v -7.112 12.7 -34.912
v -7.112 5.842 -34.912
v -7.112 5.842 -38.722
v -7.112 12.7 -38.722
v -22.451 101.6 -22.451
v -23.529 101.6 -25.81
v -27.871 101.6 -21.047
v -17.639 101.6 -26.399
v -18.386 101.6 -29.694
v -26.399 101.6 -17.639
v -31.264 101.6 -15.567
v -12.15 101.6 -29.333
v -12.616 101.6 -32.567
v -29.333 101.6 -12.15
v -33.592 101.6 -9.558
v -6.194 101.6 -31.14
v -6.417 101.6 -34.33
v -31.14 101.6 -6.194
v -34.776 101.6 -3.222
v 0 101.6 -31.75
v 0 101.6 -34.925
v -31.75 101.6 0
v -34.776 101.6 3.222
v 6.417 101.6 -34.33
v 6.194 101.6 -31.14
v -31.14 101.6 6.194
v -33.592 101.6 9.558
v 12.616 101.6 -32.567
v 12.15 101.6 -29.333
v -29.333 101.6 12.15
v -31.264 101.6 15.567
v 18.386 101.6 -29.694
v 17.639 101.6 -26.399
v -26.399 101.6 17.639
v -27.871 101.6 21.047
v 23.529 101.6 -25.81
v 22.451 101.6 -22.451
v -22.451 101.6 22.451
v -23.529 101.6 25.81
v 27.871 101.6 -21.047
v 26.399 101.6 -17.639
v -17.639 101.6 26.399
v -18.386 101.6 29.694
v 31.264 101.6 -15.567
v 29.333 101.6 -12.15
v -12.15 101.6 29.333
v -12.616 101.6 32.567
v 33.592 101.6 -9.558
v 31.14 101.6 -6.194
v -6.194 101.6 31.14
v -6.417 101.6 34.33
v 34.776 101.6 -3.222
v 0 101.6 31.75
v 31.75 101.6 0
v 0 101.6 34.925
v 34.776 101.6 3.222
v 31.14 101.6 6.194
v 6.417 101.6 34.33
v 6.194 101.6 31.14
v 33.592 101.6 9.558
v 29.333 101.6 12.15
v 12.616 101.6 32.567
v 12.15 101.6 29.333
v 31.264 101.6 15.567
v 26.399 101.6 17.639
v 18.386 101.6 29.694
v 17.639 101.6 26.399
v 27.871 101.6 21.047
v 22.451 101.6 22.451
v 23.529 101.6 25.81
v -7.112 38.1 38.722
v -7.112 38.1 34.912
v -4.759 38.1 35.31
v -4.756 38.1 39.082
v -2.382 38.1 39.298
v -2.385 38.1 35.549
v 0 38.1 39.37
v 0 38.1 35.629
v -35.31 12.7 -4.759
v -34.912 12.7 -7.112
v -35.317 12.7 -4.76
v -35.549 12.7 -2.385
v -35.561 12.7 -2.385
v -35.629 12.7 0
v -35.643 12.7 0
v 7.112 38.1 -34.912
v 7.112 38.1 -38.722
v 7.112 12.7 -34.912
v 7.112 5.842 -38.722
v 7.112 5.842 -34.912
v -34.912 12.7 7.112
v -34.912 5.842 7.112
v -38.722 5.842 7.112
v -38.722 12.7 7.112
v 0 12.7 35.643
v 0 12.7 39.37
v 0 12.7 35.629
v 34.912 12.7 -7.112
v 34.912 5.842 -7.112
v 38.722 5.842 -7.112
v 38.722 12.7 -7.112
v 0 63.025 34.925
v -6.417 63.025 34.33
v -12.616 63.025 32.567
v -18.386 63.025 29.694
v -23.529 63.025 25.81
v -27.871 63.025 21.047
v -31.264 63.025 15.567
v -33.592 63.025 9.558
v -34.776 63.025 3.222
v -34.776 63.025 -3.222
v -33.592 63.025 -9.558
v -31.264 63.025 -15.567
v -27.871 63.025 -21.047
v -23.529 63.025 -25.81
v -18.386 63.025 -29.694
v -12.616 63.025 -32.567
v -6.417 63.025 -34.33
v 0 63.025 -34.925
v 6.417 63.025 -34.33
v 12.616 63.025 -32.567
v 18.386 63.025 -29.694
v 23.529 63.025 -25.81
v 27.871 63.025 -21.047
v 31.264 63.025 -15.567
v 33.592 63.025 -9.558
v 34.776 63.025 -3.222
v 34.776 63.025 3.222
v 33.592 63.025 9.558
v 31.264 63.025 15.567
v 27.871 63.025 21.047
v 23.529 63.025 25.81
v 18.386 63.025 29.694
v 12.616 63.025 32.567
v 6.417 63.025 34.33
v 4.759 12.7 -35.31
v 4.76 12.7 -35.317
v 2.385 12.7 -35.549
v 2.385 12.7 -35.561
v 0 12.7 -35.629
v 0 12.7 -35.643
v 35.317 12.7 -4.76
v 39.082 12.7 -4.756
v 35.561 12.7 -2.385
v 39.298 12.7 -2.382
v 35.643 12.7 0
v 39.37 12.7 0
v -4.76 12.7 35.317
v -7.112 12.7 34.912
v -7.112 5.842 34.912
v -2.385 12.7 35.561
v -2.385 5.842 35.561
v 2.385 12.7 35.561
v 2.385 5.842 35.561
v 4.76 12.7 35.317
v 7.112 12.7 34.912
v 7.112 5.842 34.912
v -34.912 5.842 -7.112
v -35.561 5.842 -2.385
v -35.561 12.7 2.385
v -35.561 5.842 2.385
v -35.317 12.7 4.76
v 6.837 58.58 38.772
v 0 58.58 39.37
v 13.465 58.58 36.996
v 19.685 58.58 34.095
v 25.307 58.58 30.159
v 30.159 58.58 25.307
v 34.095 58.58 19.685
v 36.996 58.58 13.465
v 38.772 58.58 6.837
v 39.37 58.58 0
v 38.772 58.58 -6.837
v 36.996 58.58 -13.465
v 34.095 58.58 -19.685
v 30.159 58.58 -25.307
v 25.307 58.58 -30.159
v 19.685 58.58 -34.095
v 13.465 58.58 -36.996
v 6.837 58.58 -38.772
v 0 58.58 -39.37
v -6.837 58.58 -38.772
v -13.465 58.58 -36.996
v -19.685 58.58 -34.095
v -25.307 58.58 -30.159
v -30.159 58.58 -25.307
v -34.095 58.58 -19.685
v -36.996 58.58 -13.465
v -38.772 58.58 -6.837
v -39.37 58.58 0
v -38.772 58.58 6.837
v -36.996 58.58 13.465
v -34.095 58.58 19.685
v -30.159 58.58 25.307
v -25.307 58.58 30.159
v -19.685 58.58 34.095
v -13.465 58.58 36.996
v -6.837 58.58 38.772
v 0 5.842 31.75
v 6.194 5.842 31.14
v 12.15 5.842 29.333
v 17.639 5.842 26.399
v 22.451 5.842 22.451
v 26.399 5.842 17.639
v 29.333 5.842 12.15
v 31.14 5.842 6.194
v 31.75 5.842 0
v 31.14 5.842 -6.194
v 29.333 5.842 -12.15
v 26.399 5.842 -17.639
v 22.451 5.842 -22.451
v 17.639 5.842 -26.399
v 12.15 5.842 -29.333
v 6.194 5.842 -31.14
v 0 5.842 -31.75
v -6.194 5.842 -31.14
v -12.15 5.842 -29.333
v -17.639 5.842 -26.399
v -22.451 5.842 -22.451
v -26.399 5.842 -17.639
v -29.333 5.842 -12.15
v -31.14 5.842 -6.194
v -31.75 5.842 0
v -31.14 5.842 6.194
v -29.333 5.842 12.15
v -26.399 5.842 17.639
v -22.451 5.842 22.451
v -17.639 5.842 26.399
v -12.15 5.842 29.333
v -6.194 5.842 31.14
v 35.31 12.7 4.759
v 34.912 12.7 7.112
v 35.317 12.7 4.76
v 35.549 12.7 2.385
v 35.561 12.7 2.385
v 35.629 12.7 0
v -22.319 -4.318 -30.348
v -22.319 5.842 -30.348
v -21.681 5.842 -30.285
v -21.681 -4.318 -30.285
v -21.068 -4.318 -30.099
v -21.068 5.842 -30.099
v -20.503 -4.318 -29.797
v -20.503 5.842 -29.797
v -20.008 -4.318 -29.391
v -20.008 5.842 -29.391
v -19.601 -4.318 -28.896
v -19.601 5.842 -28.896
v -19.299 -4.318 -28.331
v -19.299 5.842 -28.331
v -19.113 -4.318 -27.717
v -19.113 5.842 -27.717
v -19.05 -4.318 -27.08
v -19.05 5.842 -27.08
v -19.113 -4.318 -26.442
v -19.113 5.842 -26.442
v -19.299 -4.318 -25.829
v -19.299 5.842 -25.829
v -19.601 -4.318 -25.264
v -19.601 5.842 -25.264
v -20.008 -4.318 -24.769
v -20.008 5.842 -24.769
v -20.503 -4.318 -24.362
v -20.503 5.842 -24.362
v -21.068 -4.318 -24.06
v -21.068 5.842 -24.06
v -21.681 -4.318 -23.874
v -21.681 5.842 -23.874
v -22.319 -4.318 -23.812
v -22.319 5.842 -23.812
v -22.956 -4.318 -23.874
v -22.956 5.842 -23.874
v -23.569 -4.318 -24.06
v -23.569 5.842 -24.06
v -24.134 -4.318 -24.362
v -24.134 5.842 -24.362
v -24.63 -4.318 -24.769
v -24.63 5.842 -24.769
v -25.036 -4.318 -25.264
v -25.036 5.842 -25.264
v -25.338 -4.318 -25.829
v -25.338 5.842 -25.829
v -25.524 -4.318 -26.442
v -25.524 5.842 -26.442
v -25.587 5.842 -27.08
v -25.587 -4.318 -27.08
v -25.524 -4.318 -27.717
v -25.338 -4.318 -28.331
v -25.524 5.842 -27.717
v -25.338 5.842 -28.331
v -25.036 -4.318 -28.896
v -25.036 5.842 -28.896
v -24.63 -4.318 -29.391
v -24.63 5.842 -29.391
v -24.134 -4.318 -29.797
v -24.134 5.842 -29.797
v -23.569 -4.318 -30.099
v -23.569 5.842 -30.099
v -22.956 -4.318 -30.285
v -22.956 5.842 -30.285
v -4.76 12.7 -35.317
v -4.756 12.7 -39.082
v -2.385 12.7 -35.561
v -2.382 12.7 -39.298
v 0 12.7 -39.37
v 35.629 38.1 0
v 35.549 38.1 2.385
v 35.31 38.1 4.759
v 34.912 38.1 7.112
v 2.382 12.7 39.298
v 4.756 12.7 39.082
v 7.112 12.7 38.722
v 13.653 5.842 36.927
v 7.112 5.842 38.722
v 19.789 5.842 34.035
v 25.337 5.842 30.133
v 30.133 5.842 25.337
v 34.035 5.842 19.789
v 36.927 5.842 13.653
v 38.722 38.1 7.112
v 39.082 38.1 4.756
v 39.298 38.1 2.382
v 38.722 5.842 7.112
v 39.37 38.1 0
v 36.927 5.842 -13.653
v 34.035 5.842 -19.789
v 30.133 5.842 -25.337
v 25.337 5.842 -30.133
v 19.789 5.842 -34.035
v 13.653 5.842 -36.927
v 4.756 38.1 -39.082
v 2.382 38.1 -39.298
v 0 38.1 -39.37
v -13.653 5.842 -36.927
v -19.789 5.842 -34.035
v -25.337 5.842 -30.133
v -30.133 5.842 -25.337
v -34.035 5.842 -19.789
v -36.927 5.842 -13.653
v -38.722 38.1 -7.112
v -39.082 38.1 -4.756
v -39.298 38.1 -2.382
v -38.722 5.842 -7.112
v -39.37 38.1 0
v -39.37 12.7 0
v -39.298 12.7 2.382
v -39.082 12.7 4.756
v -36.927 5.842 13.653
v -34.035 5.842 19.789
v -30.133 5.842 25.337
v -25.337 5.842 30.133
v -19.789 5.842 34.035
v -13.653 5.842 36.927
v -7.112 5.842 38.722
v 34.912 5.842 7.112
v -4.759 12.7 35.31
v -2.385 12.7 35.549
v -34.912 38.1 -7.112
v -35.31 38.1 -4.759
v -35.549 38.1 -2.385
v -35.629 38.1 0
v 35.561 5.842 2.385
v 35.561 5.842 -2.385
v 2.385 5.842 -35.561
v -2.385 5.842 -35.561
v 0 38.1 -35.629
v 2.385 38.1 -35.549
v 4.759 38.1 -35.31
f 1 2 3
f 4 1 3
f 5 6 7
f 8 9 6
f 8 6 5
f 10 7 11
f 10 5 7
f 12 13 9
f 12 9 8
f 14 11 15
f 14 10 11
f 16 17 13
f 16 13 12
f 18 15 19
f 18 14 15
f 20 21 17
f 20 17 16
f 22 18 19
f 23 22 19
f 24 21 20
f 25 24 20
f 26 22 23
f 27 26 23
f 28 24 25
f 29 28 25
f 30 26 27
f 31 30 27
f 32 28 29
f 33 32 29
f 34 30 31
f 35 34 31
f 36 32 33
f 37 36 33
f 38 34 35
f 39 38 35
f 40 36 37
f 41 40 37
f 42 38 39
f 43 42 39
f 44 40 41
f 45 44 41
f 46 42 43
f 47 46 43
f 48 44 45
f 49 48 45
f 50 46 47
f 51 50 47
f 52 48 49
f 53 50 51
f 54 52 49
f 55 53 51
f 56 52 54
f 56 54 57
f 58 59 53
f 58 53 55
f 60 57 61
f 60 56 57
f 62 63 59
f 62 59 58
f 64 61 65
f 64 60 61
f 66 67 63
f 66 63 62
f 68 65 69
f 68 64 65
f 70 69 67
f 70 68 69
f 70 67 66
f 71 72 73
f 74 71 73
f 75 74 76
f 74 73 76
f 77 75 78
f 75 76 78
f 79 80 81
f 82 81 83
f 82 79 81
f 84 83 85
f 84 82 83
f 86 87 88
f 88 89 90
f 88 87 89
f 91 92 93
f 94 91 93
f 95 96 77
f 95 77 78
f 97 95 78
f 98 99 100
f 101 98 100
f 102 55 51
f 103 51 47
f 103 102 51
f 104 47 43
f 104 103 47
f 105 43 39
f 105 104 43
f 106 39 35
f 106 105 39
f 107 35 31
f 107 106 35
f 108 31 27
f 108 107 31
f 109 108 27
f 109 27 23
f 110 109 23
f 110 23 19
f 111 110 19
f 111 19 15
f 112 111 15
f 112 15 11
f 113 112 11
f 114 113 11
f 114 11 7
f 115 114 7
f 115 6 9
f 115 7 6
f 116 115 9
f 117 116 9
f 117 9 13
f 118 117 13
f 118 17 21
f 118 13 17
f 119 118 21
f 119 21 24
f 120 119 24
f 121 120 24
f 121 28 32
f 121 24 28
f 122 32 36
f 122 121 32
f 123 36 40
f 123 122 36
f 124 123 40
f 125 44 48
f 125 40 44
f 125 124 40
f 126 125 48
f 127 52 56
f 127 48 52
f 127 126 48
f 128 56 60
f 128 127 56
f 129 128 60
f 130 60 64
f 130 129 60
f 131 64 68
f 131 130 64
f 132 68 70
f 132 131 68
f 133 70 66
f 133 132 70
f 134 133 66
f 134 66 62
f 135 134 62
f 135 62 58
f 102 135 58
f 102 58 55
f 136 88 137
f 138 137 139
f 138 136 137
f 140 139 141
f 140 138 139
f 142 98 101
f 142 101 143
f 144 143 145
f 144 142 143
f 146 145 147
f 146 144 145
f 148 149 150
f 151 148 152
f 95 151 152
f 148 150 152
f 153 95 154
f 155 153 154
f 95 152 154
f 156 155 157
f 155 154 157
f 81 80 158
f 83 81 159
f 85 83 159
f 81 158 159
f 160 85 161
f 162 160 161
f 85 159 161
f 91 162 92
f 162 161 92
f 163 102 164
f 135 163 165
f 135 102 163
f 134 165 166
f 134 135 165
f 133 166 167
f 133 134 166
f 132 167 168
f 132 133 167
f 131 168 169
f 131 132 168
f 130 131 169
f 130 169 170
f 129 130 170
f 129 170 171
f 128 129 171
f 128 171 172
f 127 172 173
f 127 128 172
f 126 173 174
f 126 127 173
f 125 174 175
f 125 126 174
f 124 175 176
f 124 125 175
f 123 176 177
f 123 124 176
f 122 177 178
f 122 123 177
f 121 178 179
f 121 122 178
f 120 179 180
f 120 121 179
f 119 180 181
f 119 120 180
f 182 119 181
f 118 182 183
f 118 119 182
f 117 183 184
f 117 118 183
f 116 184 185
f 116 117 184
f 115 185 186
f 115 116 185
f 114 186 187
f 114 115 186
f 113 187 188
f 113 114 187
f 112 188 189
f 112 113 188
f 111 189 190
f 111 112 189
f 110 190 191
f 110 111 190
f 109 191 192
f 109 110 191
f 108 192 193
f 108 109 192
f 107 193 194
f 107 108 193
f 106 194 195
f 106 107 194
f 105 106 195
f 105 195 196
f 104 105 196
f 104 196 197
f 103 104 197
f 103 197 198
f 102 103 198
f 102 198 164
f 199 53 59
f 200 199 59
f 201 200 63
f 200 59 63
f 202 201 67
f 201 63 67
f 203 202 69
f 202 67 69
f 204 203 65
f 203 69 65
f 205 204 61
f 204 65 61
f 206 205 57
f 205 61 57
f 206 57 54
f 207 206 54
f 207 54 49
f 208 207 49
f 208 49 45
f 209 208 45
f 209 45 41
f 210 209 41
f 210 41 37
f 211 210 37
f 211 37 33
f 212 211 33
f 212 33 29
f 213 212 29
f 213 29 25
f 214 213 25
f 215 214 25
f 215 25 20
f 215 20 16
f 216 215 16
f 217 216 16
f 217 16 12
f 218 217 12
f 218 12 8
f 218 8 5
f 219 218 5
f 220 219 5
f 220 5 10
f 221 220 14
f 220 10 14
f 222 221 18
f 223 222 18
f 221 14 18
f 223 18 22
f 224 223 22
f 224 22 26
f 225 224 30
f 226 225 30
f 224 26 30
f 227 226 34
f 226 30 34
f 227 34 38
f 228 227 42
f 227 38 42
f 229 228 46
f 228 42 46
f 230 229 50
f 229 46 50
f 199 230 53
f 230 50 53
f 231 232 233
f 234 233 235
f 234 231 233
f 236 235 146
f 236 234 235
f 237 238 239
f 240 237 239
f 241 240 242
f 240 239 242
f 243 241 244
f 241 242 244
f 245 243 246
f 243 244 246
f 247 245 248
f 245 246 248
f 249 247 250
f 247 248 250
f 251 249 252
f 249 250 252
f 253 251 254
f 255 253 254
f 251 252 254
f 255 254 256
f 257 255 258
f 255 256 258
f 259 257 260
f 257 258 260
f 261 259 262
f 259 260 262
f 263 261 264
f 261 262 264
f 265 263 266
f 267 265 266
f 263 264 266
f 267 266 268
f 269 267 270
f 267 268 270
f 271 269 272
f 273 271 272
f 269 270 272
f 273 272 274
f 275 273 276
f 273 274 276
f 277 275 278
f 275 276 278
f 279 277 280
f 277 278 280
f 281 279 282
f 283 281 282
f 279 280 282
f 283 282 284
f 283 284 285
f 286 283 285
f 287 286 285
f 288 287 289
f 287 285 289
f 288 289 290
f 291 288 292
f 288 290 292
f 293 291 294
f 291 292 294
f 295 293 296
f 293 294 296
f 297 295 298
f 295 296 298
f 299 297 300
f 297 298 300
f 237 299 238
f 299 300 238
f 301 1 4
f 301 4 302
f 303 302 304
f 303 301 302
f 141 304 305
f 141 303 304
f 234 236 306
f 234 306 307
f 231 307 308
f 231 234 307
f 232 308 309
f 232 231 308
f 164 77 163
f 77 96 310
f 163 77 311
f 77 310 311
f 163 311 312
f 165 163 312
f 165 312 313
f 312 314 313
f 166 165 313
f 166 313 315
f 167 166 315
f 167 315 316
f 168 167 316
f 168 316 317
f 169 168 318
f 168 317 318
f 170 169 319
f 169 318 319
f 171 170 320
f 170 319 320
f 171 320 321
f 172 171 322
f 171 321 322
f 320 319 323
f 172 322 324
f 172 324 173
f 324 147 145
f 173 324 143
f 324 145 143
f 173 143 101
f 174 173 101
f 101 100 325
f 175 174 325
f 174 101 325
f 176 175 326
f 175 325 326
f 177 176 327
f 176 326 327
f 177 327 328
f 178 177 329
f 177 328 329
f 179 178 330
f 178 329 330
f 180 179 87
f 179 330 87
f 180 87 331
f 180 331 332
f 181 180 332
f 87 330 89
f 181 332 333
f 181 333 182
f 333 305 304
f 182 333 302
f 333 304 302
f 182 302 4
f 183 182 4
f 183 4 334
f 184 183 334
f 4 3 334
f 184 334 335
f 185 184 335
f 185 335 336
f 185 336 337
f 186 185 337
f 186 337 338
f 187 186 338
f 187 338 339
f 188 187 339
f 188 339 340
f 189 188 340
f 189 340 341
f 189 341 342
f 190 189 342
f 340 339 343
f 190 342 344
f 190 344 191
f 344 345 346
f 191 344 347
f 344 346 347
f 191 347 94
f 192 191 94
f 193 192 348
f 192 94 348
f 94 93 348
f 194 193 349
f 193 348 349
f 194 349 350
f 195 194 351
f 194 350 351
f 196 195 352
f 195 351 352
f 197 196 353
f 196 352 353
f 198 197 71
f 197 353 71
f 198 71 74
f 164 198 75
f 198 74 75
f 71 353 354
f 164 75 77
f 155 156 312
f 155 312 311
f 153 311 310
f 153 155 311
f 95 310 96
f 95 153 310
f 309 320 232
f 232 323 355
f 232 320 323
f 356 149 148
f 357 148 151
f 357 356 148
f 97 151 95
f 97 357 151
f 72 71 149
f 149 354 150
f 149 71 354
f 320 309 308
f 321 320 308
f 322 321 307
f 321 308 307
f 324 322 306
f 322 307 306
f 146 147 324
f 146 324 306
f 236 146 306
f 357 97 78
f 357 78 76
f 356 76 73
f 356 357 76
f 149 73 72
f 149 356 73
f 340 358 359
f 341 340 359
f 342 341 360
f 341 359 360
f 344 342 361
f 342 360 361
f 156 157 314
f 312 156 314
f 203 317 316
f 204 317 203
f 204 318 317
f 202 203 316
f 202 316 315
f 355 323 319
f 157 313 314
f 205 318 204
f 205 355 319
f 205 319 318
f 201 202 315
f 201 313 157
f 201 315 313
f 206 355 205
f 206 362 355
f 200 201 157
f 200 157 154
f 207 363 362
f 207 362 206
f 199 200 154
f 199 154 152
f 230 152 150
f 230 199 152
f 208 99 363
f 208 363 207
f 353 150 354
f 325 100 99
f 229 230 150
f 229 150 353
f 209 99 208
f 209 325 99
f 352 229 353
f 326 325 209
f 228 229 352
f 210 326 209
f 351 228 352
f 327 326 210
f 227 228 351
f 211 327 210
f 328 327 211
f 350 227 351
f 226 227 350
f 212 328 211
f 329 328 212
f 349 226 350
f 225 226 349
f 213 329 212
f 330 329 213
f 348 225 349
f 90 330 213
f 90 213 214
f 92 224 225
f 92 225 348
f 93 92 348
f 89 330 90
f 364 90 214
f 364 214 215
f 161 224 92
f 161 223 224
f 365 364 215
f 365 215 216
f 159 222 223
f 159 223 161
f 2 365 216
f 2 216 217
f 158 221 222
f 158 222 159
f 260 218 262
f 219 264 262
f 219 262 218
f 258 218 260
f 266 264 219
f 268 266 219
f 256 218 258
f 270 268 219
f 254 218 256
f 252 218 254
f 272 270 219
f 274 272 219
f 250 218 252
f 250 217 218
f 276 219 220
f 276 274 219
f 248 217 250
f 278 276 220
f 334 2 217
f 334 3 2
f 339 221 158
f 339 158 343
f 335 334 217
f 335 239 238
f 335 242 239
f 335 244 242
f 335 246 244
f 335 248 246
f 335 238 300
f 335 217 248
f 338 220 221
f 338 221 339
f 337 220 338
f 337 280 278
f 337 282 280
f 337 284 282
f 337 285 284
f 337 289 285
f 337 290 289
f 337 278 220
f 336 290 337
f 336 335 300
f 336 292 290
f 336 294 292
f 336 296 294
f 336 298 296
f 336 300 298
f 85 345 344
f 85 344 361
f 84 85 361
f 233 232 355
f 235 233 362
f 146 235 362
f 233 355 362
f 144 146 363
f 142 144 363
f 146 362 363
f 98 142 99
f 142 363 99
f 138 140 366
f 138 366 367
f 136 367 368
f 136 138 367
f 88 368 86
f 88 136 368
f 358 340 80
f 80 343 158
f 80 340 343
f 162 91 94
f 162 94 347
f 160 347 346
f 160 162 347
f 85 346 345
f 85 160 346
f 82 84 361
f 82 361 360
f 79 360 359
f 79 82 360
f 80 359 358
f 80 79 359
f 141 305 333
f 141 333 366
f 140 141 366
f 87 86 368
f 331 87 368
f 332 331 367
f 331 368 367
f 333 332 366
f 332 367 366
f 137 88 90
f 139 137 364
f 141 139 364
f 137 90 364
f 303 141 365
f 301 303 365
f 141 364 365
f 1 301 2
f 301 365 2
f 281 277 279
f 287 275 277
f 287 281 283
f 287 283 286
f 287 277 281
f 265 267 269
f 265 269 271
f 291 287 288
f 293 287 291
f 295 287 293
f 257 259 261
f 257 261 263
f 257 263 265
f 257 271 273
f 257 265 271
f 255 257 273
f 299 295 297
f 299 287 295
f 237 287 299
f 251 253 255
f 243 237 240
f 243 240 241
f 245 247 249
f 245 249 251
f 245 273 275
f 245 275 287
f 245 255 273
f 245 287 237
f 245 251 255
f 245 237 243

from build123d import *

# Parameters (mm, degrees)
SKETCH1_R           = 39.37
BOSS_EXTRUDE1_DEPTH = 101.6
SKETCH2_R           = 31.75
CUT_EXTRUDE1_DEPTH  = 116.855745649
CUT_EXTRUDE2_START  = -33.02
SKETCH3_R           = 39.37
SKETCH3_R_2         = 34.925
CUT_EXTRUDE2_DEPTH  = 33.02
CUT_EXTRUDE3_DEPTH  = 12.7
SKETCH9_R           = 39.558823483
CUT_EXTRUDE5_DEPTH  = 111.768173967
SKETCH10_R          = 3.268271246
BOSS_EXTRUDE2_DEPTH = 10.16
CUT_EXTRUDE6_DEPTH  = 25.4
CIRPATTERN1_COUNT   = 4
CHAMFER1_SIZE       = 10


with BuildPart() as part:
    # Sketch1 → Boss-Extrude1 (new body)
    with BuildSketch(Plane(origin=(0, 0, 0), x_dir=(1, 0, 0), z_dir=(0, 1, 0))):
        with Locations(Location((0, 0, 0), (0, 0, 270))):
            Circle(SKETCH1_R)
    extrude(amount=BOSS_EXTRUDE1_DEPTH)

    # Sketch2 → Cut-Extrude1 (cut, through all)
    with BuildSketch(Plane(origin=(0, 101.6, 0), x_dir=(1, 0, 0), z_dir=(0, 1, 0))):
        with Locations(Location((0, 0, 0), (0, 0, 270))):
            Circle(SKETCH2_R)
    extrude(amount=-CUT_EXTRUDE1_DEPTH, mode=Mode.SUBTRACT)

    # Sketch3 → Cut-Extrude2 (cut)
    with BuildSketch(Plane(origin=(0, 101.6, 0), x_dir=(1, 0, 0), z_dir=(0, 1, 0)).offset(CUT_EXTRUDE2_START)):
        with Locations(Location((0, 0, 0), (0, 0, 270))):
            Circle(SKETCH3_R)
        with Locations(Location((0, 0, 0), (0, 0, 270))):
            Circle(SKETCH3_R_2, mode=Mode.SUBTRACT)
    extrude(amount=CUT_EXTRUDE2_DEPTH, mode=Mode.SUBTRACT)

    # Sketch5 → Cut-Extrude3 (cut)
    with BuildSketch(Plane.XZ):
        with BuildLine():
            Line((-7.112, -34.912297917), (-7.112, -38.722297917))
            ThreePointArc((-7.112, -38.722297917), (0, -39.380800166), (7.112, -38.722297917))
            Line((7.112, -38.722297917), (7.112, -34.912297917))
            ThreePointArc((7.112, -34.912297917), (0, -35.642563047), (-7.112, -34.912297917))
        make_face()
    cut_extrude3 = extrude(amount=-CUT_EXTRUDE3_DEPTH, mode=Mode.SUBTRACT)

    # Sketch9 → Cut-Extrude5 (cut, through all)
    with BuildSketch(Plane(origin=(0, 5.842, 0), x_dir=(-1, 0, 0), z_dir=(0, -1, 0))):
        Circle(SKETCH9_R)
    extrude(amount=CUT_EXTRUDE5_DEPTH, mode=Mode.SUBTRACT)

    # Sketch10 → Boss-Extrude2 (add)
    with BuildSketch(Plane.XZ.offset(-5.842)):
        with Locations(Location((-22.318582537, -27.07979346, 0), (0, 0, 270))):
            Circle(SKETCH10_R)
    extrude(amount=BOSS_EXTRUDE2_DEPTH)

    # Sketch23 → Cut-Extrude6 (cut)
    with BuildSketch(Plane.XZ.offset(-12.7)):
        with BuildLine():
            Line((0, -39.37), (0, -35.629329068))
            ThreePointArc((0, -35.629329068), (3.574027059, -35.449618058), (7.112, -34.912297917))
            Line((7.112, -34.912297917), (7.112, -38.722297917))
            ThreePointArc((7.112, -38.722297917), (3.570716384, -39.20774011), (0, -39.37))
        make_face()
    cut_extrude6 = extrude(amount=-CUT_EXTRUDE6_DEPTH, mode=Mode.SUBTRACT)

    # CirPattern1: Cut-Extrude3, Cut-Extrude6 ×4 about axis
    cirpattern1_axis = Axis((0, 0, 0), (0, 1, 0))
    add([cut_extrude3.rotate(cirpattern1_axis, i * 360 / CIRPATTERN1_COUNT) for i in range(1, CIRPATTERN1_COUNT)], mode=Mode.SUBTRACT)
    add([cut_extrude6.rotate(cirpattern1_axis, i * 360 / CIRPATTERN1_COUNT) for i in range(1, CIRPATTERN1_COUNT)], mode=Mode.SUBTRACT)

    # Chamfer1
    # the kernel refuses this chamfer: 10 mm, written as the material it takes off along each edge
    with BuildSketch(Plane(origin=(0, 68.58, 0), x_dir=(0, 0, 1), z_dir=(-1, 0, 0))) as chamfer1_piece_1_section:
        Polygon((39.37, -CHAMFER1_SIZE), (39.37 - CHAMFER1_SIZE, 0), (39.37, 0), align=None)
    chamfer1_piece_1 = revolve(axis=Axis((0, 68.58, 0), (0, 1, 0)), mode=Mode.PRIVATE)
    chamfer1_piece_1 = chamfer1_piece_1 - Plane(origin=(0, 60.807735234, 0), x_dir=(0, 0, 1), z_dir=(0, -1, 0)) * Cylinder(34.925, 158, mode=Mode.PRIVATE)
    add(chamfer1_piece_1, mode=Mode.SUBTRACT)


solid = part.part
